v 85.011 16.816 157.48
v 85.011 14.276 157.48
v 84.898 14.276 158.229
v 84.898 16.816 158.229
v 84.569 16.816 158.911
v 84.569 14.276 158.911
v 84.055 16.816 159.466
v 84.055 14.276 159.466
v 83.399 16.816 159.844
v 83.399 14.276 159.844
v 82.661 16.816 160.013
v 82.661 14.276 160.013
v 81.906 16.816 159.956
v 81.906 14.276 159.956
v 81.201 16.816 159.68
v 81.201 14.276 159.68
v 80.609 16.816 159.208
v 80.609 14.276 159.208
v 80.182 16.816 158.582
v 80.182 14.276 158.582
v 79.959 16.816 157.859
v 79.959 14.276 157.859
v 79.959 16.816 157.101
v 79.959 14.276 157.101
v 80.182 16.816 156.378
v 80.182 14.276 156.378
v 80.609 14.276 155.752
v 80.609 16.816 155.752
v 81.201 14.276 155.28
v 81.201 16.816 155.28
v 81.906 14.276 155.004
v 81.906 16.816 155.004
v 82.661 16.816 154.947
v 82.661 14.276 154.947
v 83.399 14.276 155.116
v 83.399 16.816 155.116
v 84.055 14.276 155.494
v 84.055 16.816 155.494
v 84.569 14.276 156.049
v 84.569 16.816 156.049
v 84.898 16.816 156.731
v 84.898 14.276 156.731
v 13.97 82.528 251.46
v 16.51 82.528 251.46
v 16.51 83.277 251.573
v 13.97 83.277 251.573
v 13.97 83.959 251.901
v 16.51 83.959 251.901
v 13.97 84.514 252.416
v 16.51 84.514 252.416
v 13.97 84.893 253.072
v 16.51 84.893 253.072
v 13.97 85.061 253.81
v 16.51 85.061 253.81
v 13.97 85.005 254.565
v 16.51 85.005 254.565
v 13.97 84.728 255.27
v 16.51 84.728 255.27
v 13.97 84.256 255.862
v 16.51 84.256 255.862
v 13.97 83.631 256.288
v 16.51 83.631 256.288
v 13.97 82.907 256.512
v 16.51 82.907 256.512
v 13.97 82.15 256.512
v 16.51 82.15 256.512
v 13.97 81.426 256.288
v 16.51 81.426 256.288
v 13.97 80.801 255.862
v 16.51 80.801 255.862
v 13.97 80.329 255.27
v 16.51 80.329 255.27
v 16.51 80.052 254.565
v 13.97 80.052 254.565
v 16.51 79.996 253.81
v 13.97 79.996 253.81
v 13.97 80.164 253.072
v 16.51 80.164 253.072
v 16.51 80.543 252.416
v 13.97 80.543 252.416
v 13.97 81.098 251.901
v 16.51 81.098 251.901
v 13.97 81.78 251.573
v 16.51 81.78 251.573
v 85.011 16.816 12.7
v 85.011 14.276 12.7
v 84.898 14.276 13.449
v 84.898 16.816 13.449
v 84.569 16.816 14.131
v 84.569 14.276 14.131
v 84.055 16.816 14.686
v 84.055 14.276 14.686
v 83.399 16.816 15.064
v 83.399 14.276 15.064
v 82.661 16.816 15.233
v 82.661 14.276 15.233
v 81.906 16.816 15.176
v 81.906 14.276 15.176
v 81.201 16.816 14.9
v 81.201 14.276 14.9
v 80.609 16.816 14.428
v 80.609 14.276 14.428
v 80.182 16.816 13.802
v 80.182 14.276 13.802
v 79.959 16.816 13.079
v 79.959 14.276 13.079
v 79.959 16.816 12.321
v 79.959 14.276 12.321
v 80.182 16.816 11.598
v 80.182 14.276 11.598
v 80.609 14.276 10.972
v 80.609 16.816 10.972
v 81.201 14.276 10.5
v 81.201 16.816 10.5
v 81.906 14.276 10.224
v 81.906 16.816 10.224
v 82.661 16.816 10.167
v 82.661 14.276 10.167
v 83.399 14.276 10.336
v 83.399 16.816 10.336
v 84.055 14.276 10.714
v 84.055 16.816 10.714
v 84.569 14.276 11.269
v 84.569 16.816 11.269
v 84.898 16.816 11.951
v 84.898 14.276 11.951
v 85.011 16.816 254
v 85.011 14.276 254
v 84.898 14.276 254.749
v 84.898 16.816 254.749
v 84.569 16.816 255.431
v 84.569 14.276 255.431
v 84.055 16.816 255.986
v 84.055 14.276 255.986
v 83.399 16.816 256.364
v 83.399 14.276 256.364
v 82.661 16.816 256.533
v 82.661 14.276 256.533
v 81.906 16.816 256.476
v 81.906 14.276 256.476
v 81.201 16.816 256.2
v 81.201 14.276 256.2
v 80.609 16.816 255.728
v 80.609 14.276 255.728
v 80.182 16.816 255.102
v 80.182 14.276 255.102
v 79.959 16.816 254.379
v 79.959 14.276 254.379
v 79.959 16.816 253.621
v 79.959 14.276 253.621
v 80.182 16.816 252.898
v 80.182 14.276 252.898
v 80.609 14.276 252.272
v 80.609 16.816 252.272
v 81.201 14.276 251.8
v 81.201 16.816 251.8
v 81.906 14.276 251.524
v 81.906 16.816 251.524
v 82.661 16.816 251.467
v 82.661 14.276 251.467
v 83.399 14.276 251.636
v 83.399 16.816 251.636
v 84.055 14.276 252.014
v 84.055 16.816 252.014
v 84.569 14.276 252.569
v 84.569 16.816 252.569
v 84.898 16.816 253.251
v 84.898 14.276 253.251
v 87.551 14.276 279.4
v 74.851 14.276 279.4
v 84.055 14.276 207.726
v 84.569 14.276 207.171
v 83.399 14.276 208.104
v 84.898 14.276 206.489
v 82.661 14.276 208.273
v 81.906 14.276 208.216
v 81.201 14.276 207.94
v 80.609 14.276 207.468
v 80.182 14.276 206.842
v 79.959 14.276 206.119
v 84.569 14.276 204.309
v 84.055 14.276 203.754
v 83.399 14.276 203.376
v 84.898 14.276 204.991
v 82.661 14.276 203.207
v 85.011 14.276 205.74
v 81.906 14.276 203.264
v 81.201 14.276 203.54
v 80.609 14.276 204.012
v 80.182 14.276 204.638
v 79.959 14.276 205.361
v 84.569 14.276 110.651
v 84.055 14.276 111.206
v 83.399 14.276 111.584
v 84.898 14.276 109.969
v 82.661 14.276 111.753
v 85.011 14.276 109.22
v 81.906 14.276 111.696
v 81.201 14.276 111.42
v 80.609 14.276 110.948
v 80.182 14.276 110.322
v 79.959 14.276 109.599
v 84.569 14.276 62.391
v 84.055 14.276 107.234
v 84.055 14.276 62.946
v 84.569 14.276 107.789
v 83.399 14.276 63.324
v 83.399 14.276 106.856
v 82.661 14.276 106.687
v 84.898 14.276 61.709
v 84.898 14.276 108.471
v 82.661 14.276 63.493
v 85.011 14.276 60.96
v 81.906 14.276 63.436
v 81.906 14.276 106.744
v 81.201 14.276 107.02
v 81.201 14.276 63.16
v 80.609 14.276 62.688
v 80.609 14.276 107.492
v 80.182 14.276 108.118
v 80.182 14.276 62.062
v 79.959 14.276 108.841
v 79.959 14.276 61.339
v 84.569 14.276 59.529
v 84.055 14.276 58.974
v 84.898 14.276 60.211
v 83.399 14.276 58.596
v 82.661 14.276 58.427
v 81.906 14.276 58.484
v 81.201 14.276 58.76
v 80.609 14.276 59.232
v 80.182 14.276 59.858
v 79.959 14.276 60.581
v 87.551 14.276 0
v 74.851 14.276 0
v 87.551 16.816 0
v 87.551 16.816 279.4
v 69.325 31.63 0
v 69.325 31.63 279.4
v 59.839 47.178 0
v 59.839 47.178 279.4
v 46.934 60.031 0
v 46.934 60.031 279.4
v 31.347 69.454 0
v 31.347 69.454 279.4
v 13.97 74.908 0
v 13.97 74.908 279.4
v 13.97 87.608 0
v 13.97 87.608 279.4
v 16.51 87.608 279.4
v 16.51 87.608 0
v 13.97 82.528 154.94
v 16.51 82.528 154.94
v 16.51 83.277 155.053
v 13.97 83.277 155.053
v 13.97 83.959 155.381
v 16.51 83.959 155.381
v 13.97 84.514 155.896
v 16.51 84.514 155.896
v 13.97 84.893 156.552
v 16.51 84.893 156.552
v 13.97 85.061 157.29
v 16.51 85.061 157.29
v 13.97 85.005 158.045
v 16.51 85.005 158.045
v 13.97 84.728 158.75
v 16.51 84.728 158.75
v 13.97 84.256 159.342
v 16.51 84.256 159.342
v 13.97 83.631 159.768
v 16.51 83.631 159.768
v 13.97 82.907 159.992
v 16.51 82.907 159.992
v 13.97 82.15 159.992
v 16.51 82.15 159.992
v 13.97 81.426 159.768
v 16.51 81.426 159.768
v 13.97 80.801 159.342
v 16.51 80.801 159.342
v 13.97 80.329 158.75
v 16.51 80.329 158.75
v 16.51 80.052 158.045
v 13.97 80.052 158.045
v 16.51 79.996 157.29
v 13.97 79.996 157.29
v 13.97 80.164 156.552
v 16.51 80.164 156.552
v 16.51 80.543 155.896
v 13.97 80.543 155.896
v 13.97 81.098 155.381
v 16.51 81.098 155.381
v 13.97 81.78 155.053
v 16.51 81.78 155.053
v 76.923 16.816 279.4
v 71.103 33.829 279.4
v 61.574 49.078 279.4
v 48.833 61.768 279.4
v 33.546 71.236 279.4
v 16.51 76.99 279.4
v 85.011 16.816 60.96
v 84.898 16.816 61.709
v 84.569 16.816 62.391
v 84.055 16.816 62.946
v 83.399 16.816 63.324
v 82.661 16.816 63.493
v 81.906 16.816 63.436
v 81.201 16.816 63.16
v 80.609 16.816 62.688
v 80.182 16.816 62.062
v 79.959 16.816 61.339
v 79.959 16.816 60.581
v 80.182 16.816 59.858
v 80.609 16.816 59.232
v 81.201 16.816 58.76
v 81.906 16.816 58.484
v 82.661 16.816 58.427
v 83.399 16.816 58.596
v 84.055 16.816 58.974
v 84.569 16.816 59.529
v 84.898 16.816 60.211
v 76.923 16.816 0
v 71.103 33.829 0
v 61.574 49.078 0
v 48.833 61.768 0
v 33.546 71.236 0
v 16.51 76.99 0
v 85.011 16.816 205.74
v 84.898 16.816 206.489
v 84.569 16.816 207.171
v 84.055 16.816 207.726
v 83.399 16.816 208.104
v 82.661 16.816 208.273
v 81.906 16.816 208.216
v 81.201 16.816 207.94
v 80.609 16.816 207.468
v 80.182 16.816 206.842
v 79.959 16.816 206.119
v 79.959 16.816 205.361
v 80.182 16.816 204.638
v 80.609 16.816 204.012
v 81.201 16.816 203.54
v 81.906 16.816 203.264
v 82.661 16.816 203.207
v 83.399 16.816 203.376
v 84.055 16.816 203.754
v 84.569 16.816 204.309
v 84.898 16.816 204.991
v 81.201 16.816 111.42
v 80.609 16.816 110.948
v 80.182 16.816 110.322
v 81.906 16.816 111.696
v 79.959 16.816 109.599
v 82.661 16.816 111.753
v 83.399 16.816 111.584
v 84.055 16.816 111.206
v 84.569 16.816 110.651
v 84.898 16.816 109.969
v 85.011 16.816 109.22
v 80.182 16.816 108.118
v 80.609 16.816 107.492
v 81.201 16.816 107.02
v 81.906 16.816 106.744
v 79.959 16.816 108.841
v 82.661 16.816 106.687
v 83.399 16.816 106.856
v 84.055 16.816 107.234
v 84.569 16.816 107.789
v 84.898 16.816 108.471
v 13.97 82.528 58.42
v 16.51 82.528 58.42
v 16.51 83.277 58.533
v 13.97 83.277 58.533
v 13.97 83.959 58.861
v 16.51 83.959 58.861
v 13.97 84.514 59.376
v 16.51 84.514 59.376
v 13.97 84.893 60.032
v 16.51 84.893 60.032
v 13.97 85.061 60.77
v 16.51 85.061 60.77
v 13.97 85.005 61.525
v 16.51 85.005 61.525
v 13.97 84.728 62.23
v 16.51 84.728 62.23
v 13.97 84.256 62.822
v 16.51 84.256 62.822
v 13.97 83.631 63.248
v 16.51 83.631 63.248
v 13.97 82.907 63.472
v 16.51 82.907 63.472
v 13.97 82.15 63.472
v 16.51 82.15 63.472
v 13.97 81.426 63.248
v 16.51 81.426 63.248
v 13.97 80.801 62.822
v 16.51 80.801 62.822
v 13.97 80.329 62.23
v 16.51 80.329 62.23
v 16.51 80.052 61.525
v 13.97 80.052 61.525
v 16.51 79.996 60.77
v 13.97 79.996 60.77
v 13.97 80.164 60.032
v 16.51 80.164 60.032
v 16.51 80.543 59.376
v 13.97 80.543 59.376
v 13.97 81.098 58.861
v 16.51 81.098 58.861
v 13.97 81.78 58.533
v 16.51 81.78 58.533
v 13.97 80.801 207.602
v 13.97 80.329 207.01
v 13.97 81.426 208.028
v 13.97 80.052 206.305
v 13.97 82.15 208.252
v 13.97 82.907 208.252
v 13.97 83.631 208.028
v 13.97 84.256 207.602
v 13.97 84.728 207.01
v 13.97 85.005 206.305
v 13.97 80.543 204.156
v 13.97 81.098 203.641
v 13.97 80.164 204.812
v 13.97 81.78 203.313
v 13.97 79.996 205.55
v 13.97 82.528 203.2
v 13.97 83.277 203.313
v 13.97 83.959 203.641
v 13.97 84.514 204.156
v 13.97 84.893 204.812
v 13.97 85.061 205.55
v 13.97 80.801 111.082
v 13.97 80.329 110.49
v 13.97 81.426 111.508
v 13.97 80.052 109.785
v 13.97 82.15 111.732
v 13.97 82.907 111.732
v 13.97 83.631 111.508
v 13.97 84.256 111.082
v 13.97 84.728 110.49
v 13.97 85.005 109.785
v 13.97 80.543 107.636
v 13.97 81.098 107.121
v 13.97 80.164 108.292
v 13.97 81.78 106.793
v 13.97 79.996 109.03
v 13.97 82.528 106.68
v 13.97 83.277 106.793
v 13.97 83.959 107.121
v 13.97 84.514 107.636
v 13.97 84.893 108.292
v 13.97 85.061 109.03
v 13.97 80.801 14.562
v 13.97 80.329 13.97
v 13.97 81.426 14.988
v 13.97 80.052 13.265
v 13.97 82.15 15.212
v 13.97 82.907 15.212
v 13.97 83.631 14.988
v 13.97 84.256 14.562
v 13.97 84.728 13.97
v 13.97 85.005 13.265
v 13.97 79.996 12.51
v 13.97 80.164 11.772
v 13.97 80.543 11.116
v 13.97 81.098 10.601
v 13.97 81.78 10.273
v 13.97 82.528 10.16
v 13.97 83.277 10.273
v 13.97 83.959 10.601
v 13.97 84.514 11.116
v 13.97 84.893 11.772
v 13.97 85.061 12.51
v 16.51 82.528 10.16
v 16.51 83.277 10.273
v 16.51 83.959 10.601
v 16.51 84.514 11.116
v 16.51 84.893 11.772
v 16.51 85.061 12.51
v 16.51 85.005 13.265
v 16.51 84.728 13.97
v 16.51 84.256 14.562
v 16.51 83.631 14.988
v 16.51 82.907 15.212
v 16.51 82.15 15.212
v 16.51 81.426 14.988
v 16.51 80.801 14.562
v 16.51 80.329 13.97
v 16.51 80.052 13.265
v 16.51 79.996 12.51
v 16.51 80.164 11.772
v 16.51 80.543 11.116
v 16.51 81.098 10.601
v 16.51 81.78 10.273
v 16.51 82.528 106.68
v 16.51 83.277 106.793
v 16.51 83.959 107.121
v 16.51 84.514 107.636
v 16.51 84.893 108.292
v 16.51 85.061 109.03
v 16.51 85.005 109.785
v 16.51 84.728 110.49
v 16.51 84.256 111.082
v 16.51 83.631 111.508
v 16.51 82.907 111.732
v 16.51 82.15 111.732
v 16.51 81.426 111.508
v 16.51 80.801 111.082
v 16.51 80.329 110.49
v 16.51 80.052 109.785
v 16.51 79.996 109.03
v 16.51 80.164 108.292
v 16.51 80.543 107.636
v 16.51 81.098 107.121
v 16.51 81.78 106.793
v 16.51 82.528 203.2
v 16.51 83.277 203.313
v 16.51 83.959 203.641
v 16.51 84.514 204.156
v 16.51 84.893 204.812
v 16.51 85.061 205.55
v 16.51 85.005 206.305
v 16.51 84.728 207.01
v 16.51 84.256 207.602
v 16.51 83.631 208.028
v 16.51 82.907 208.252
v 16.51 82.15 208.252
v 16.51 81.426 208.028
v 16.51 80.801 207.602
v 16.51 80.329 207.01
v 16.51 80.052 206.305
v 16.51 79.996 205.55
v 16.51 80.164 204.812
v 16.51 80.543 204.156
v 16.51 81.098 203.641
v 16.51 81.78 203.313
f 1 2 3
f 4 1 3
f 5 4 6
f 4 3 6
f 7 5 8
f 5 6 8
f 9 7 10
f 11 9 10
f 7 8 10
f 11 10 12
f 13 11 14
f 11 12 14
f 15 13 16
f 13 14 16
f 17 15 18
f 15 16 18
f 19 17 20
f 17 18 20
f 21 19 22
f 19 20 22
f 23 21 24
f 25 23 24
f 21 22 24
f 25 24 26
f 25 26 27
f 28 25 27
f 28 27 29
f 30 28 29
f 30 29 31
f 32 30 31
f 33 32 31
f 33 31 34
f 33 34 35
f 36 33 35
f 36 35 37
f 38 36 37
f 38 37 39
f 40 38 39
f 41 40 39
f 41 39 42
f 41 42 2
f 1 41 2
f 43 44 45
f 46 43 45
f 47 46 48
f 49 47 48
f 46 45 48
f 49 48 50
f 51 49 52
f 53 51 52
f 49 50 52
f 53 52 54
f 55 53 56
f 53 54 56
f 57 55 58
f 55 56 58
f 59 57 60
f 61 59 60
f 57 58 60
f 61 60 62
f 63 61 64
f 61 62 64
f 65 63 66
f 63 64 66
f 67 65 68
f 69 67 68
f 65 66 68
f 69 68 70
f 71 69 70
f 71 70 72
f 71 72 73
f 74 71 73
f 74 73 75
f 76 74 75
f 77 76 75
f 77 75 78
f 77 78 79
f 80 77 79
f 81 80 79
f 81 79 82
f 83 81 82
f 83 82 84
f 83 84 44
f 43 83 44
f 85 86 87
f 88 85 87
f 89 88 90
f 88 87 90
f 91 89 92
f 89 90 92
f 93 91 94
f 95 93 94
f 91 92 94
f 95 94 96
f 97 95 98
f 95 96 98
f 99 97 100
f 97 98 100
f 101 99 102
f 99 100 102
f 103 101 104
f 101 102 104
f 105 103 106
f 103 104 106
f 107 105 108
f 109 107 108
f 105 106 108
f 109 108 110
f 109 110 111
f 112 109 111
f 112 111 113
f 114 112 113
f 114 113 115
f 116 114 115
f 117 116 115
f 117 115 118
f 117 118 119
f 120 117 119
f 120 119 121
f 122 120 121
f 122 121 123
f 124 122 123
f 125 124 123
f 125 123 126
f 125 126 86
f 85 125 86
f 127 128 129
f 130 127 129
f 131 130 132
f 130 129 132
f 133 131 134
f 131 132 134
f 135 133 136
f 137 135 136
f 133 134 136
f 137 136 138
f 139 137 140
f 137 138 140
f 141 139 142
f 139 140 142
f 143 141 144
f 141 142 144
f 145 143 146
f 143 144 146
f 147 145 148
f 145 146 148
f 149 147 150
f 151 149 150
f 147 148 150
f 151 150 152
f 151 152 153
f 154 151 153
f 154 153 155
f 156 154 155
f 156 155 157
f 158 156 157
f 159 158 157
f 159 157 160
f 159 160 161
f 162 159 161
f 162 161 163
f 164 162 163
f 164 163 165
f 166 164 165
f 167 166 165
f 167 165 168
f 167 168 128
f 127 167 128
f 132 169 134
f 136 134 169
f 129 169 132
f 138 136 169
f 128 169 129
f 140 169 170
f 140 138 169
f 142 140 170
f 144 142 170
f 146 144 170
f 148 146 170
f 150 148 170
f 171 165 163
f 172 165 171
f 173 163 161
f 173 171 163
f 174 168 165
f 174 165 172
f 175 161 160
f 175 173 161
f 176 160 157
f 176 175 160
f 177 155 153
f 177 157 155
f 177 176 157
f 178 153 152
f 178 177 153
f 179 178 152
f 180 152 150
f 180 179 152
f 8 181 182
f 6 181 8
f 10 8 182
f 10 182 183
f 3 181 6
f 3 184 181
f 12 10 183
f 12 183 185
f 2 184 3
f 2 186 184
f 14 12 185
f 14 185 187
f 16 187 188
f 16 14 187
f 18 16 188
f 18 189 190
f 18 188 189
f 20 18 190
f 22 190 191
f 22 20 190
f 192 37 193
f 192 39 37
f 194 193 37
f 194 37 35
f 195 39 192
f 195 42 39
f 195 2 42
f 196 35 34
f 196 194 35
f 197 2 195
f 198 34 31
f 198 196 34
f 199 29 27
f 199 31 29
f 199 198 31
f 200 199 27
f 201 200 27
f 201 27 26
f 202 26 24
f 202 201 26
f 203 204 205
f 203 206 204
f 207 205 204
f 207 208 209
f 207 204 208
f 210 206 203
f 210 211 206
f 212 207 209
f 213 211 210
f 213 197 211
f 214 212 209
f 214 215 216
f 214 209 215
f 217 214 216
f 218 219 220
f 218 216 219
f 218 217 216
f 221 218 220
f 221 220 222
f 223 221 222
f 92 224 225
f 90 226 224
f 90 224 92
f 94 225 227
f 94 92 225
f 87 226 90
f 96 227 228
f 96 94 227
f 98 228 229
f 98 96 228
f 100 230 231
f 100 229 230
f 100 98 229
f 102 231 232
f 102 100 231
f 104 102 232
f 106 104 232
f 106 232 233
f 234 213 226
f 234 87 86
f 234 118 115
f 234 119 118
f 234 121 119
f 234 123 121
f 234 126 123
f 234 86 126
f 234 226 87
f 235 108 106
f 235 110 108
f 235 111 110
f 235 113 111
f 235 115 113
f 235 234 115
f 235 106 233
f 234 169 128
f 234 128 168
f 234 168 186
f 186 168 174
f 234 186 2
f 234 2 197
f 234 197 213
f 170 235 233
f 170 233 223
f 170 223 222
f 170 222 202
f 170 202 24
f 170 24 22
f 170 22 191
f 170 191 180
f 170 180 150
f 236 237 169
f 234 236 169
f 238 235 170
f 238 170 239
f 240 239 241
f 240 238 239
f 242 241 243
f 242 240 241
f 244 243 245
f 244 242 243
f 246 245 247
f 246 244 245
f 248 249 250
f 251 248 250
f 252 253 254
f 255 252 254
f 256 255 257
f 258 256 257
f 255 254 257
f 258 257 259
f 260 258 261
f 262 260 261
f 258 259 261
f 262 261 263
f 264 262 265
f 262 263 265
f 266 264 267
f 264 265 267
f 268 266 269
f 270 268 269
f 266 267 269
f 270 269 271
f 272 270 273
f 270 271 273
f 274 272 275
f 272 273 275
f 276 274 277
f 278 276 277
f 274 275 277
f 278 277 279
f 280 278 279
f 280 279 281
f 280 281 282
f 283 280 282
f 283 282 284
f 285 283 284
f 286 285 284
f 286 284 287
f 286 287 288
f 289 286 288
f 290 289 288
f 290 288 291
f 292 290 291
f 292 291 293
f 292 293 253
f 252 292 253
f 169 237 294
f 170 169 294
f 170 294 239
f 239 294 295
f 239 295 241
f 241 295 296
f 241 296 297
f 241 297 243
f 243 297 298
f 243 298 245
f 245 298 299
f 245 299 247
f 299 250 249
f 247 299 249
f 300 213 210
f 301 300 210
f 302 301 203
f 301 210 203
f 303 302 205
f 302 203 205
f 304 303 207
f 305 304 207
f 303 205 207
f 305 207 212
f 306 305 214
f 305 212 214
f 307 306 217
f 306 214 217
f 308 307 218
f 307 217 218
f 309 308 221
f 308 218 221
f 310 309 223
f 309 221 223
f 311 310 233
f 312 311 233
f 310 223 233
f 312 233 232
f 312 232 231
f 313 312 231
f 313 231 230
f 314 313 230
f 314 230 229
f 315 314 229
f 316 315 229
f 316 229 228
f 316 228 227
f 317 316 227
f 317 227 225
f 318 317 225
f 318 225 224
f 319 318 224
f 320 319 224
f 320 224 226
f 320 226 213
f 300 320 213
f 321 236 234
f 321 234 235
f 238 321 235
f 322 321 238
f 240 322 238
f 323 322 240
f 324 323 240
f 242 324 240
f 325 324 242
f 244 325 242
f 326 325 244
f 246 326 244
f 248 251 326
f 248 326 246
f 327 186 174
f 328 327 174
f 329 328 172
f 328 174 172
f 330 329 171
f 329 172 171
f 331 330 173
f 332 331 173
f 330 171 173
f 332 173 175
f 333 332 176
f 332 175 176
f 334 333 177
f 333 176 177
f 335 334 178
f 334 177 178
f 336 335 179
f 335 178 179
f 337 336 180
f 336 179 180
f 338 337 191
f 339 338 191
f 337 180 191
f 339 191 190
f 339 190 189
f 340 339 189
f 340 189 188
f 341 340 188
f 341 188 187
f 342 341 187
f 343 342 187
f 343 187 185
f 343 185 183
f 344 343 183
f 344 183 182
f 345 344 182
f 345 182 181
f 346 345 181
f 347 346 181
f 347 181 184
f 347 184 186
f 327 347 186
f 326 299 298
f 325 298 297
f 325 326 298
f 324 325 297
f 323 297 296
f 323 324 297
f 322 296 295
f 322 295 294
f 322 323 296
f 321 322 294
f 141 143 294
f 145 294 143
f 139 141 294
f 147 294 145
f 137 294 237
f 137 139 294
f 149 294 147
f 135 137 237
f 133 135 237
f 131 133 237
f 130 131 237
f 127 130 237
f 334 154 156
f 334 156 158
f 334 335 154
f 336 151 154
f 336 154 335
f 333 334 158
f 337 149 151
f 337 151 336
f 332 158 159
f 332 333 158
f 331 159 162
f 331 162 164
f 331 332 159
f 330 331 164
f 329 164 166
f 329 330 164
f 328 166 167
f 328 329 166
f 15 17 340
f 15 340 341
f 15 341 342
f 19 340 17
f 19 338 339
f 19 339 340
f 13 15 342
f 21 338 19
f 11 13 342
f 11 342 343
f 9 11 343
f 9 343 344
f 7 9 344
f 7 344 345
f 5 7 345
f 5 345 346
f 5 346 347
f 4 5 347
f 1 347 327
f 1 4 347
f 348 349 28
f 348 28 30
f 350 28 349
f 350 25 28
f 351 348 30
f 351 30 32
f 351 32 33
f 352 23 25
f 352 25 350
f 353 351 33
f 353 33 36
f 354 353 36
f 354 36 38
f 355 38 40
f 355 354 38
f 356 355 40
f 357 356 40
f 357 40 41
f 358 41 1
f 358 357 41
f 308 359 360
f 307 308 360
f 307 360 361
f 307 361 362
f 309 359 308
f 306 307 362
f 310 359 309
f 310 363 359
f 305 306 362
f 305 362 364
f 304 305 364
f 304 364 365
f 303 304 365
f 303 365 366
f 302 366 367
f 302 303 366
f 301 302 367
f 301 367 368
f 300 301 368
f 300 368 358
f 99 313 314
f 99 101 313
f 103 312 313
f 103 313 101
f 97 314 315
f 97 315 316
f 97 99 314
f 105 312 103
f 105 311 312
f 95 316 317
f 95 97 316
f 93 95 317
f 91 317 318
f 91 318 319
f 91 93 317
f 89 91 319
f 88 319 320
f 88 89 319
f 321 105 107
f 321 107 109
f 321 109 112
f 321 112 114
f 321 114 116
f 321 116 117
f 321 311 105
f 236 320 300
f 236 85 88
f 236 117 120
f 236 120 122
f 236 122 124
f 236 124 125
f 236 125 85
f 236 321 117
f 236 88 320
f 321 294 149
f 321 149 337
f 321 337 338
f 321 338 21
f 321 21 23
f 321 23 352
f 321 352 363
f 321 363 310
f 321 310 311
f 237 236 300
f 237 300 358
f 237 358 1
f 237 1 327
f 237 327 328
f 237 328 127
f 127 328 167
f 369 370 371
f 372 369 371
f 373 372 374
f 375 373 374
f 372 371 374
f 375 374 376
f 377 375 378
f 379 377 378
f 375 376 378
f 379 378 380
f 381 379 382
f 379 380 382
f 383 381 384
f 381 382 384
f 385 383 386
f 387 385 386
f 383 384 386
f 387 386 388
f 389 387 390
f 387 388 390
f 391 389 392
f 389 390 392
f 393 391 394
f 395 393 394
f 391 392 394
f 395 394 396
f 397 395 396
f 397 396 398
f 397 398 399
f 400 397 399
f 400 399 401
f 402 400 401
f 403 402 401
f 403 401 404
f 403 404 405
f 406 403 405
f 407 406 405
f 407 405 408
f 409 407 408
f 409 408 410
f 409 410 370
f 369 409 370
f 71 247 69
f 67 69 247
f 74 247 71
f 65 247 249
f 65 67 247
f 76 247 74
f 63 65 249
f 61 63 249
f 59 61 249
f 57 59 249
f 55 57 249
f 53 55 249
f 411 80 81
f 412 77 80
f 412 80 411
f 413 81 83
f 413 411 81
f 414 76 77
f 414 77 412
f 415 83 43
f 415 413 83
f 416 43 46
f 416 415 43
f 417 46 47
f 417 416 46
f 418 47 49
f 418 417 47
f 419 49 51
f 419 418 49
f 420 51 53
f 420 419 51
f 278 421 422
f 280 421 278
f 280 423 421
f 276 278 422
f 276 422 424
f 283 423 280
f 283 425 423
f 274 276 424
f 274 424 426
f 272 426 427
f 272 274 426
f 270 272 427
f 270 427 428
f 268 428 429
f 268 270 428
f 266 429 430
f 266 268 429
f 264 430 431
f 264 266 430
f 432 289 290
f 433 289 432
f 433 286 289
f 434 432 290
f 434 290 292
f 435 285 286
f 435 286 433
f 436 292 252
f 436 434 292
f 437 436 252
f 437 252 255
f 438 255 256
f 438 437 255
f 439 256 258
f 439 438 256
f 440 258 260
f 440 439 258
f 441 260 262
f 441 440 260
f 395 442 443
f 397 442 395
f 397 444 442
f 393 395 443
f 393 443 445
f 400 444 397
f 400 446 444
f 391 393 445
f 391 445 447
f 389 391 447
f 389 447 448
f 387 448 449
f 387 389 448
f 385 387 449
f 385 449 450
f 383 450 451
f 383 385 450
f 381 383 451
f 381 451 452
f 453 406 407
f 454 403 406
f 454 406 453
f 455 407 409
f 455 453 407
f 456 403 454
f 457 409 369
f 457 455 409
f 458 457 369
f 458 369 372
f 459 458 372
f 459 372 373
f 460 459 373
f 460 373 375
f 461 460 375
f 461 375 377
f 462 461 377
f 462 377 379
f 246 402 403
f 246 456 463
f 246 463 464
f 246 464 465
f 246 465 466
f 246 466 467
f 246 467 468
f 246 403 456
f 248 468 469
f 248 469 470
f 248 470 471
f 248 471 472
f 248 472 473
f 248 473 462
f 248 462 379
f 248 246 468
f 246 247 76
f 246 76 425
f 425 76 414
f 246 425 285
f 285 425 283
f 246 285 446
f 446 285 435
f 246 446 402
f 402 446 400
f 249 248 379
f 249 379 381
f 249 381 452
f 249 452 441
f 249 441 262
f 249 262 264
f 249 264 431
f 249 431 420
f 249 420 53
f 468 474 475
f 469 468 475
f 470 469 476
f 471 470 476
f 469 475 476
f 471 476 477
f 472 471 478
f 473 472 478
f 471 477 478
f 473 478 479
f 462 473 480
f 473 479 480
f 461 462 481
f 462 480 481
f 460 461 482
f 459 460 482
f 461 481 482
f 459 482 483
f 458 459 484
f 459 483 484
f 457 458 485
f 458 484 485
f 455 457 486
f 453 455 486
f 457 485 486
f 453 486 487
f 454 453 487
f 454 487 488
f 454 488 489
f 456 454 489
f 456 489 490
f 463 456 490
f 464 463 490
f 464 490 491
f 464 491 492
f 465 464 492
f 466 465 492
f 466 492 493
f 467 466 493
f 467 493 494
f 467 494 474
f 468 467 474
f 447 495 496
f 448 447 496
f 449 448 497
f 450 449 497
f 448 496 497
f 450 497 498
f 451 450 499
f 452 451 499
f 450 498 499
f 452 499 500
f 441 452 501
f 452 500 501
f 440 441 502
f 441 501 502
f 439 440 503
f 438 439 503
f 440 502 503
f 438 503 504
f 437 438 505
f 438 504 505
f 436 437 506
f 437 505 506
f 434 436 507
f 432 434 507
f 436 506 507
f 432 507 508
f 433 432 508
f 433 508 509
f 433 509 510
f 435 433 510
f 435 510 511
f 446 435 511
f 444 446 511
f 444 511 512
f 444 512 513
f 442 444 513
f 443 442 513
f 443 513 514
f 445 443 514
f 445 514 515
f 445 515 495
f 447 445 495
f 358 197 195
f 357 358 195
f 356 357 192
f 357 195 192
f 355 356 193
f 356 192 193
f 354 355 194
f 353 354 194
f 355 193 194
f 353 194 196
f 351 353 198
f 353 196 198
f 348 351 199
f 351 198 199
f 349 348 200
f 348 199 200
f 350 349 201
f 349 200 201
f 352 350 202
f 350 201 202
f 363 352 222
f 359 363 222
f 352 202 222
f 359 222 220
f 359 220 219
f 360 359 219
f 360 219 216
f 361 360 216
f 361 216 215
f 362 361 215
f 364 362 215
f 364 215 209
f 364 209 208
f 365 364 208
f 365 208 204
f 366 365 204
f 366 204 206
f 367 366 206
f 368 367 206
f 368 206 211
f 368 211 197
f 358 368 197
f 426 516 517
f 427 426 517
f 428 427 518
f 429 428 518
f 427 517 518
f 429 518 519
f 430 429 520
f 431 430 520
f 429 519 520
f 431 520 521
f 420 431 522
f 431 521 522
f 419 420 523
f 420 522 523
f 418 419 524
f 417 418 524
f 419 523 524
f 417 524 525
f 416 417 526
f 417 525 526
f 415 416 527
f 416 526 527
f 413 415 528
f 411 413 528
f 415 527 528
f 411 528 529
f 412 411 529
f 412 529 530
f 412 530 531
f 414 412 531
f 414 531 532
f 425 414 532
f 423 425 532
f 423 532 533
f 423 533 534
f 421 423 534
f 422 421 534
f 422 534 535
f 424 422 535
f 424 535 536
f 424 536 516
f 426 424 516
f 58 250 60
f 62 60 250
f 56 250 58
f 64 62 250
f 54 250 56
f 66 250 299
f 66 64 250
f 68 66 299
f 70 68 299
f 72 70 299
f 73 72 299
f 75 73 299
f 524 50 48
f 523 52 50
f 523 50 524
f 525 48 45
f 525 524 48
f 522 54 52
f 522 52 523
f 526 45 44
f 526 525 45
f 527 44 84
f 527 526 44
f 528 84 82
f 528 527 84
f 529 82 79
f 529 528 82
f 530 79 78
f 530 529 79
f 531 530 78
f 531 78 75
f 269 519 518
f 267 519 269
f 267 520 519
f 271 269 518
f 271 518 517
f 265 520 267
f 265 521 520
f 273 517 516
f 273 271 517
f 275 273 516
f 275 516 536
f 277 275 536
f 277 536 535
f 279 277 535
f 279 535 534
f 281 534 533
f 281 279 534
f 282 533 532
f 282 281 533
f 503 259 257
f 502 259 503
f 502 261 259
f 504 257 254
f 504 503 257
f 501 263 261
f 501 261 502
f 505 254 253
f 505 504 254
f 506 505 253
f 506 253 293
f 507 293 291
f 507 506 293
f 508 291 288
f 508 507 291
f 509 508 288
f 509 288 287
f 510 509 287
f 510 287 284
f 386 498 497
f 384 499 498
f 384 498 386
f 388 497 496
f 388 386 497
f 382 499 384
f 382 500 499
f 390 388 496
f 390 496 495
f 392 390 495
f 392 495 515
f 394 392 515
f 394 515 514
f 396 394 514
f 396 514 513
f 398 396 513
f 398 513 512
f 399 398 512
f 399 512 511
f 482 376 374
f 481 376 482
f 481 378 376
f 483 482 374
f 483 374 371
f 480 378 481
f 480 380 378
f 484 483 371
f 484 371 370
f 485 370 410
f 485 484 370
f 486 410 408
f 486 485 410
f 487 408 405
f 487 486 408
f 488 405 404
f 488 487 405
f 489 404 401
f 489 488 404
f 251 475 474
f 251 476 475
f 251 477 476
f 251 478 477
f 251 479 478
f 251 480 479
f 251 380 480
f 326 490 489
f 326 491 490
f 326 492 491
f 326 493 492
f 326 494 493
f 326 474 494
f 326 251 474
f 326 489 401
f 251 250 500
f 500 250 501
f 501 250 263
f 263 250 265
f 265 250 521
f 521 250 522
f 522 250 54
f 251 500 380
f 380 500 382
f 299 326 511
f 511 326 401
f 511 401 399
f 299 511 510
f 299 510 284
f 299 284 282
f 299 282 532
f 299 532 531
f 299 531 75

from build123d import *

# Parameters (mm, degrees)
BOSS_EXTRUDE1_DEPTH = 279.4
SKETCH3_R           = 2.54
CUT_EXTRUDE1_DEPTH  = 279.4
SKETCH4_R           = 2.54
CUT_EXTRUDE2_DEPTH  = 279.4


with BuildPart() as part:
    # Sketch2 → Boss-Extrude1 (new body)
    with BuildSketch(Plane.XY):
        with BuildLine():
            Line((76.923497933, 16.815560225), (87.550840879, 16.815560225))
            Line((87.550840879, 16.815560225), (87.550840879, 14.275560225))
            Line((87.550840879, 14.275560225), (74.850840879, 14.275560225))
            ThreePointArc((74.850840879, 14.275560225), (53.771488035, 53.99136111), (13.97, 74.908471484))
            Line((13.97, 74.908471484), (13.97, 87.608471484))
            Line((13.97, 87.608471484), (16.51, 87.608471484))
            Line((16.51, 87.608471484), (16.51, 76.989658396))
            ThreePointArc((16.51, 76.989658396), (55.566943021, 55.788013437), (76.923497933, 16.815560225))
        make_face()
    extrude(amount=BOSS_EXTRUDE1_DEPTH)

    # Sketch3 → Cut-Extrude1 (cut)
    with BuildSketch(Plane(origin=(16.51, 0, 0), x_dir=(0, 0, -1), z_dir=(1, 0, 0))):
        with Locations((-12.7, 82.528471484)):
            Circle(SKETCH3_R)
        with Locations((-60.96, 82.528471484)):
            Circle(SKETCH3_R)
        with Locations((-109.22, 82.528471484)):
            Circle(SKETCH3_R)
        with Locations((-157.48, 82.528471484)):
            Circle(SKETCH3_R)
        with Locations((-205.74, 82.528471484)):
            Circle(SKETCH3_R)
        with Locations((-254, 82.528471484)):
            Circle(SKETCH3_R)
    extrude(amount=-CUT_EXTRUDE1_DEPTH, mode=Mode.SUBTRACT)

    # Sketch4 → Cut-Extrude2 (cut)
    with BuildSketch(Plane.XZ.offset(-14.275560225)):
        with Locations((82.470840879, 12.7)):
            Circle(SKETCH4_R)
        with Locations((82.470840879, 60.96)):
            Circle(SKETCH4_R)
        with Locations((82.470840879, 109.22)):
            Circle(SKETCH4_R)
        with Locations((82.470840879, 157.48)):
            Circle(SKETCH4_R)
        with Locations((82.470840879, 205.74)):
            Circle(SKETCH4_R)
        with Locations((82.470840879, 254)):
            Circle(SKETCH4_R)
    extrude(amount=-CUT_EXTRUDE2_DEPTH, mode=Mode.SUBTRACT)


solid = part.part
